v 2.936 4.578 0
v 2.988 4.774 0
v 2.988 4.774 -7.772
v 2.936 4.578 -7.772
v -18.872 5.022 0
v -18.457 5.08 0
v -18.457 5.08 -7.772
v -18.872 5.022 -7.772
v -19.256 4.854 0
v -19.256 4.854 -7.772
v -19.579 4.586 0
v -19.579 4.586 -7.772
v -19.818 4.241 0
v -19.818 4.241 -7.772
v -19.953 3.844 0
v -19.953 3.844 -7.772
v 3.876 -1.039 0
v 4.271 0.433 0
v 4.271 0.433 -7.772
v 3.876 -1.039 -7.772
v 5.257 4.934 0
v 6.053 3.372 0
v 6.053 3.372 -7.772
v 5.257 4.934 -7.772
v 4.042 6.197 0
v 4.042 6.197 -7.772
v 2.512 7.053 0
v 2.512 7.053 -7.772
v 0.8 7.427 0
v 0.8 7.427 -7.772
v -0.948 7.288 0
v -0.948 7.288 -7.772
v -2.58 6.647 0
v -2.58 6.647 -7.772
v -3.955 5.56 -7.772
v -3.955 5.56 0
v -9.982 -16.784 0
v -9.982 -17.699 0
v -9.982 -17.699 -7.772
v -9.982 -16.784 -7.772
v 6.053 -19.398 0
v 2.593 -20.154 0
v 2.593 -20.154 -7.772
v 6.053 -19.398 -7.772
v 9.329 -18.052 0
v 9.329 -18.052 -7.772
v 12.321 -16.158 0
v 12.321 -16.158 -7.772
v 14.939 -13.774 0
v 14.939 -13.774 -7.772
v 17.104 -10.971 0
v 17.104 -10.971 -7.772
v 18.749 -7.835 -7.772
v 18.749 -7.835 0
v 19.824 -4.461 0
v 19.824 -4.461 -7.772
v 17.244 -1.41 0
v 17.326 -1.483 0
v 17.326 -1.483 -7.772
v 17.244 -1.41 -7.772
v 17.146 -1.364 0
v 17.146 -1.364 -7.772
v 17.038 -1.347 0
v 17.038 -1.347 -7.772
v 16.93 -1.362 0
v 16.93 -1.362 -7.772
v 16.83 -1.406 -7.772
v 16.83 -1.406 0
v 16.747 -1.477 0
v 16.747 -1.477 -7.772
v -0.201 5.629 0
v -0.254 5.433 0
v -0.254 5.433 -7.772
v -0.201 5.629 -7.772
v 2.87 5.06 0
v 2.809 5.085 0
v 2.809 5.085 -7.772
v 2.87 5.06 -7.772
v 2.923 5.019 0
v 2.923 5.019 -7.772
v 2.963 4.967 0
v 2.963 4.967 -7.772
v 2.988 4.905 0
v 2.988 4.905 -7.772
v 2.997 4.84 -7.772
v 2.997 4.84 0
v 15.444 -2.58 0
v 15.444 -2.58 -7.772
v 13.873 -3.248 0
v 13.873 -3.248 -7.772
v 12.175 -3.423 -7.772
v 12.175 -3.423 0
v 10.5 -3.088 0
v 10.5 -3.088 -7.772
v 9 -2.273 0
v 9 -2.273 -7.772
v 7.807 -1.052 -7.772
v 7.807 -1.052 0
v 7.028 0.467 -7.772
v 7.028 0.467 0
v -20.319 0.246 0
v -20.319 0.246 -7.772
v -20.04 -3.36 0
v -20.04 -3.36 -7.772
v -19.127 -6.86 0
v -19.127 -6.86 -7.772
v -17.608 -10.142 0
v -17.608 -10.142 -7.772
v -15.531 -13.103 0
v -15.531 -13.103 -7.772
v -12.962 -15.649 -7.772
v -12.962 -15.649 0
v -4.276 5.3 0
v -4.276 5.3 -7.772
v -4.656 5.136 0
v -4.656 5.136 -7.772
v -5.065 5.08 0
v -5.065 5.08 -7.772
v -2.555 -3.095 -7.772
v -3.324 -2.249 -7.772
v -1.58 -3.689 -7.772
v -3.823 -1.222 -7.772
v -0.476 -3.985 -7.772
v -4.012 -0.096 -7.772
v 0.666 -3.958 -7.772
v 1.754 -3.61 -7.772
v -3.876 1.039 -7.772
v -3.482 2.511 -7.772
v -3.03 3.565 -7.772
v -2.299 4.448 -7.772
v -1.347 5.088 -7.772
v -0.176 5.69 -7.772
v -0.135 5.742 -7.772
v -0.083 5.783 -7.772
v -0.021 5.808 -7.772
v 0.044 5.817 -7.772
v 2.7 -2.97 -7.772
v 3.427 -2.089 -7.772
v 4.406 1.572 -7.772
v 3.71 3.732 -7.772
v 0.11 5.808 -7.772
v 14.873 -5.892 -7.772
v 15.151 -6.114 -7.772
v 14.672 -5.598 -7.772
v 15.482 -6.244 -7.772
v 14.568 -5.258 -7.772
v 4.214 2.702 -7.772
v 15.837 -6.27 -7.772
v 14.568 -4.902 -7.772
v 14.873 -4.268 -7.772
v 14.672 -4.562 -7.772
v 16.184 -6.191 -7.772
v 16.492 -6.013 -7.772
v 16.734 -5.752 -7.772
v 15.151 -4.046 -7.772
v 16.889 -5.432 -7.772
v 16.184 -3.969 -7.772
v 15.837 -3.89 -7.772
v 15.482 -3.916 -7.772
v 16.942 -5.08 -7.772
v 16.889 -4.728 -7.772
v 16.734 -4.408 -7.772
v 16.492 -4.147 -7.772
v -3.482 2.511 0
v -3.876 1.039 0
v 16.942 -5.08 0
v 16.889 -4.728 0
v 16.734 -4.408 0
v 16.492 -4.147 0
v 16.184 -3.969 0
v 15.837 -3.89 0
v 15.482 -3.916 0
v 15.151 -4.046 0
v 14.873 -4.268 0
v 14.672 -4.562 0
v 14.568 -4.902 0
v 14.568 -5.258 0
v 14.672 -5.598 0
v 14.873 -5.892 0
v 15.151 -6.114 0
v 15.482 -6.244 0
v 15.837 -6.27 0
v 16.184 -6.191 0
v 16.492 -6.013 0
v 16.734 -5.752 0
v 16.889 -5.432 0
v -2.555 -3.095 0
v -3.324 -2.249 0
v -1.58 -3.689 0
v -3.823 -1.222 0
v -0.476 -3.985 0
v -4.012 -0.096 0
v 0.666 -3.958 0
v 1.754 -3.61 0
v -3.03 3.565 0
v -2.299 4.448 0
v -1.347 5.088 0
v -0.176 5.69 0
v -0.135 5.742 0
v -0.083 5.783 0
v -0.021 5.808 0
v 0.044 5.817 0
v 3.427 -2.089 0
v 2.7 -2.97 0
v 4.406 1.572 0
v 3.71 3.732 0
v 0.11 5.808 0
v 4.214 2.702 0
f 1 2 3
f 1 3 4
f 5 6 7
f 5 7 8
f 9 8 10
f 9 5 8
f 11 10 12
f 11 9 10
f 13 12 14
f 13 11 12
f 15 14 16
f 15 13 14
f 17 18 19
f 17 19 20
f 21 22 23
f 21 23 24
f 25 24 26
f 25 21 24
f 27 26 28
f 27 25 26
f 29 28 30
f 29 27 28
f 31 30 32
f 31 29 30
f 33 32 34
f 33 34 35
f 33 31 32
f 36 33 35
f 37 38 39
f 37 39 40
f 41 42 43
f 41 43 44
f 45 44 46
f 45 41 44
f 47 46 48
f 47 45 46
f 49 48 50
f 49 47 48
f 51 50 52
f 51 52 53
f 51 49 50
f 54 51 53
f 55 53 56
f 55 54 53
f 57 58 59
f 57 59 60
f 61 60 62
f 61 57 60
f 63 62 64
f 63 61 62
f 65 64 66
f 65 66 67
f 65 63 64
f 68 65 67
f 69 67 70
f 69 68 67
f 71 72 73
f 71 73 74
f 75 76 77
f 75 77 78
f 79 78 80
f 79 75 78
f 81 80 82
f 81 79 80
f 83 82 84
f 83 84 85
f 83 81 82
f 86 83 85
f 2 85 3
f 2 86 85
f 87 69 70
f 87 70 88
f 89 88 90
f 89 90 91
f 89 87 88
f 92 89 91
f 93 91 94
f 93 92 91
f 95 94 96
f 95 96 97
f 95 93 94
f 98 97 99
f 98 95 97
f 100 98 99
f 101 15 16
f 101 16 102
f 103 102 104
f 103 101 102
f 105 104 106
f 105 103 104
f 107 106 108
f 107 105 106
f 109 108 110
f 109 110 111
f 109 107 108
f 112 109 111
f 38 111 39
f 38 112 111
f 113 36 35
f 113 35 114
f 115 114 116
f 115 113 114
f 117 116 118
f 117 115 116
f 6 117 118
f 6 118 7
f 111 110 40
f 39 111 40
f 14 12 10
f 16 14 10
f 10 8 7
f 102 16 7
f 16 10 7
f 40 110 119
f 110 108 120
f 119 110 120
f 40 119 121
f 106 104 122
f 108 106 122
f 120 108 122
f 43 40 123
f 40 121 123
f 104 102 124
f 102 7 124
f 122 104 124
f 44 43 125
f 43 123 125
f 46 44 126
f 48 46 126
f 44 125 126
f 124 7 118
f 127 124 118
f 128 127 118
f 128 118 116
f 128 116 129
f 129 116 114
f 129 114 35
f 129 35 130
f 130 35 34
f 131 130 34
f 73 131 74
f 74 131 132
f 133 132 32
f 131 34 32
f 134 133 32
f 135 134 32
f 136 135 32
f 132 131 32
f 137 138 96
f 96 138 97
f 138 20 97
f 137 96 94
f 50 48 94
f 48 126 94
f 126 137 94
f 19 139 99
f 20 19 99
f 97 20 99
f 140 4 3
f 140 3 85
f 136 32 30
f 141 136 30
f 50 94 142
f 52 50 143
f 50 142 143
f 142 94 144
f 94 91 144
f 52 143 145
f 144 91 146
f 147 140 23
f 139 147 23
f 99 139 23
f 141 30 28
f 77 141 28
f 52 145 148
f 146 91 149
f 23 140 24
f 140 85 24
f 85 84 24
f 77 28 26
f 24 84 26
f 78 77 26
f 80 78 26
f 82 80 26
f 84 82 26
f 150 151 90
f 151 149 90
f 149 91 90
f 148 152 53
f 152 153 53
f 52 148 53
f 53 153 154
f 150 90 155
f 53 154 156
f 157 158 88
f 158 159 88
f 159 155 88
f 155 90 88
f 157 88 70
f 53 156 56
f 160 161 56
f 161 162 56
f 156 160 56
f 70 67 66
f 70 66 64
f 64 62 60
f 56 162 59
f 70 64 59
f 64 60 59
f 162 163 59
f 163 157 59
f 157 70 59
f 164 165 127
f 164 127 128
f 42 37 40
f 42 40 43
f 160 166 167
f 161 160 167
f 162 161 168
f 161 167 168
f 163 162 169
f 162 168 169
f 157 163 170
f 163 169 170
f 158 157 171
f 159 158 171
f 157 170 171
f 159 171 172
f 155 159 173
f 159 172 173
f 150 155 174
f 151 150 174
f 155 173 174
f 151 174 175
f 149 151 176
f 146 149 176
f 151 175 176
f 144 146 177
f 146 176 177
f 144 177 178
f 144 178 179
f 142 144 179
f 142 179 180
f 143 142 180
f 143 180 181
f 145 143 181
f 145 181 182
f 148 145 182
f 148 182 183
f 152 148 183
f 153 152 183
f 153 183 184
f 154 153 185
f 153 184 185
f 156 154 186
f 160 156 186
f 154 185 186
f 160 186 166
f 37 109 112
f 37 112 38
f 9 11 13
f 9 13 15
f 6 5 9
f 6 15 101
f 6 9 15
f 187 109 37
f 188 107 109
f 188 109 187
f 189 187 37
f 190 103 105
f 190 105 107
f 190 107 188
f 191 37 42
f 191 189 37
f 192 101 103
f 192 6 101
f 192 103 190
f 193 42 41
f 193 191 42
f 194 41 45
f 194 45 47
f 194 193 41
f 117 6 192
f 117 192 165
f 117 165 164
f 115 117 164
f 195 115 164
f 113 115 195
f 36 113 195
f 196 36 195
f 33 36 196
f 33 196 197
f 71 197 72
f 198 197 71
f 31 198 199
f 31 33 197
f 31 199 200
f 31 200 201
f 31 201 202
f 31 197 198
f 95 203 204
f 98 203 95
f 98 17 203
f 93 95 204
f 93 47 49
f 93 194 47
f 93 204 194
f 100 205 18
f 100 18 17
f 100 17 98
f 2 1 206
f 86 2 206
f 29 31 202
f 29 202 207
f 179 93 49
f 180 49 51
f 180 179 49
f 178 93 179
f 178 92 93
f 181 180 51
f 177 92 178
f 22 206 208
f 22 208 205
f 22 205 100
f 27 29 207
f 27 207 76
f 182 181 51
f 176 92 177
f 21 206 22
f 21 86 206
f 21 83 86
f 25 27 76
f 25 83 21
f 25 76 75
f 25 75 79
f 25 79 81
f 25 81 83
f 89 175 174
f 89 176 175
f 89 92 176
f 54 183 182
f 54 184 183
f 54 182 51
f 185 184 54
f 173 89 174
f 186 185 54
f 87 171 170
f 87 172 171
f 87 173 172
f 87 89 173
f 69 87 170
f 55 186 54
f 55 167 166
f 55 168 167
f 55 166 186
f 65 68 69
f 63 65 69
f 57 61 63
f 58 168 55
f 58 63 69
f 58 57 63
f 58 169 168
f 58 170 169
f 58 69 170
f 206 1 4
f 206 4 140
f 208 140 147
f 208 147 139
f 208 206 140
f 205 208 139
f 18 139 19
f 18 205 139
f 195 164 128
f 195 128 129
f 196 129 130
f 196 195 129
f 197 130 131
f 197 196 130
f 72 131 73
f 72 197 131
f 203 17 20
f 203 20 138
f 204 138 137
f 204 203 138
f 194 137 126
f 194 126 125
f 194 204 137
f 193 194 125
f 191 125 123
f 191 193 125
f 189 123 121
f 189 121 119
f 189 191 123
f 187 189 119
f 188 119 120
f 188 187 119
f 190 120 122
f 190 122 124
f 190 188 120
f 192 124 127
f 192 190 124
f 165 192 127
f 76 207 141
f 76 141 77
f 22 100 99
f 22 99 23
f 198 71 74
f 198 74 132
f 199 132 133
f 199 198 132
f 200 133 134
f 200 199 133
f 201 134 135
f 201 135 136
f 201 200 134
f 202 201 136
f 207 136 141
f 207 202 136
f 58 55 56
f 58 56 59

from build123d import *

# Parameters (mm, degrees)
SKETCH1_R           = 1.1938
BOSS_EXTRUDE1_DEPTH = 7.7724


with BuildPart() as part:
    # Sketch1 → Boss-Extrude1 (new body)
    with BuildSketch(Plane.XY):
        with BuildLine():
            Line((-5.065262452, 5.08), (-18.456556559, 5.08))
            ThreePointArc((-18.456556559, 5.08), (-19.426909517, 4.731155792), (-19.953034117, 3.844324324))
            ThreePointArc((-19.953034117, 3.844324324), (-18.44069754, -8.534815418), (-9.9822, -17.699098371))
            Line((-9.9822, -17.699098371), (-9.9822, -16.784328658))
            Line((-9.9822, -16.784328658), (2.593084415, -20.153865962))
            ThreePointArc((2.593084415, -20.153865962), (13.682234942, -15.023276839), (19.824330155, -4.46075486))
            Line((19.824330155, -4.46075486), (17.325781624, -1.483100672))
            ThreePointArc((17.325781624, -1.483100672), (17.037851626, -1.347023051), (16.747173773, -1.477127579))
            ThreePointArc((16.747173773, -1.477127579), (11.324901076, -3.317959511), (7.028137334, 0.467212181))
            Line((7.028137334, 0.467212181), (6.053096787, 3.371693793))
            ThreePointArc((6.053096787, 3.371693793), (1.669604011, 7.303273092), (-3.95481445, 5.560217822))
            ThreePointArc((-3.95481445, 5.560217822), (-4.460344292, 5.205196933), (-5.065262452, 5.08))
        make_face()
        with Locations((15.748, -5.08)):
            Circle(SKETCH1_R, mode=Mode.SUBTRACT)
        with BuildLine():
            Line((-3.876453526, 1.038692592), (-3.482013301, 2.510763551))
            ThreePointArc((-3.482013301, 2.510763551), (-2.298514325, 4.447599489), (-0.253578298, 5.432607064))
            Line((-0.253578298, 5.432607064), (-0.201054745, 5.628627633))
            ThreePointArc((-0.201054745, 5.628627633), (-0.082709585, 5.782858048), (0.110030452, 5.808232755))
            Line((0.110030452, 5.808232755), (2.808827211, 5.085092343))
            ThreePointArc((2.808827211, 5.085092343), (2.963057626, 4.966747183), (2.988432333, 4.774007146))
            Line((2.988432333, 4.774007146), (2.93590878, 4.577986577))
            ThreePointArc((2.93590878, 4.577986577), (4.214371541, 2.702476981), (4.270893751, 0.433378367))
            Line((4.270893751, 0.433378367), (3.876453526, -1.038692592))
            ThreePointArc((3.876453526, -1.038692592), (-1.038692592, -3.876453526), (-3.876453526, 1.038692592))
        make_face(mode=Mode.SUBTRACT)
    extrude(amount=-BOSS_EXTRUDE1_DEPTH)


solid = part.part
